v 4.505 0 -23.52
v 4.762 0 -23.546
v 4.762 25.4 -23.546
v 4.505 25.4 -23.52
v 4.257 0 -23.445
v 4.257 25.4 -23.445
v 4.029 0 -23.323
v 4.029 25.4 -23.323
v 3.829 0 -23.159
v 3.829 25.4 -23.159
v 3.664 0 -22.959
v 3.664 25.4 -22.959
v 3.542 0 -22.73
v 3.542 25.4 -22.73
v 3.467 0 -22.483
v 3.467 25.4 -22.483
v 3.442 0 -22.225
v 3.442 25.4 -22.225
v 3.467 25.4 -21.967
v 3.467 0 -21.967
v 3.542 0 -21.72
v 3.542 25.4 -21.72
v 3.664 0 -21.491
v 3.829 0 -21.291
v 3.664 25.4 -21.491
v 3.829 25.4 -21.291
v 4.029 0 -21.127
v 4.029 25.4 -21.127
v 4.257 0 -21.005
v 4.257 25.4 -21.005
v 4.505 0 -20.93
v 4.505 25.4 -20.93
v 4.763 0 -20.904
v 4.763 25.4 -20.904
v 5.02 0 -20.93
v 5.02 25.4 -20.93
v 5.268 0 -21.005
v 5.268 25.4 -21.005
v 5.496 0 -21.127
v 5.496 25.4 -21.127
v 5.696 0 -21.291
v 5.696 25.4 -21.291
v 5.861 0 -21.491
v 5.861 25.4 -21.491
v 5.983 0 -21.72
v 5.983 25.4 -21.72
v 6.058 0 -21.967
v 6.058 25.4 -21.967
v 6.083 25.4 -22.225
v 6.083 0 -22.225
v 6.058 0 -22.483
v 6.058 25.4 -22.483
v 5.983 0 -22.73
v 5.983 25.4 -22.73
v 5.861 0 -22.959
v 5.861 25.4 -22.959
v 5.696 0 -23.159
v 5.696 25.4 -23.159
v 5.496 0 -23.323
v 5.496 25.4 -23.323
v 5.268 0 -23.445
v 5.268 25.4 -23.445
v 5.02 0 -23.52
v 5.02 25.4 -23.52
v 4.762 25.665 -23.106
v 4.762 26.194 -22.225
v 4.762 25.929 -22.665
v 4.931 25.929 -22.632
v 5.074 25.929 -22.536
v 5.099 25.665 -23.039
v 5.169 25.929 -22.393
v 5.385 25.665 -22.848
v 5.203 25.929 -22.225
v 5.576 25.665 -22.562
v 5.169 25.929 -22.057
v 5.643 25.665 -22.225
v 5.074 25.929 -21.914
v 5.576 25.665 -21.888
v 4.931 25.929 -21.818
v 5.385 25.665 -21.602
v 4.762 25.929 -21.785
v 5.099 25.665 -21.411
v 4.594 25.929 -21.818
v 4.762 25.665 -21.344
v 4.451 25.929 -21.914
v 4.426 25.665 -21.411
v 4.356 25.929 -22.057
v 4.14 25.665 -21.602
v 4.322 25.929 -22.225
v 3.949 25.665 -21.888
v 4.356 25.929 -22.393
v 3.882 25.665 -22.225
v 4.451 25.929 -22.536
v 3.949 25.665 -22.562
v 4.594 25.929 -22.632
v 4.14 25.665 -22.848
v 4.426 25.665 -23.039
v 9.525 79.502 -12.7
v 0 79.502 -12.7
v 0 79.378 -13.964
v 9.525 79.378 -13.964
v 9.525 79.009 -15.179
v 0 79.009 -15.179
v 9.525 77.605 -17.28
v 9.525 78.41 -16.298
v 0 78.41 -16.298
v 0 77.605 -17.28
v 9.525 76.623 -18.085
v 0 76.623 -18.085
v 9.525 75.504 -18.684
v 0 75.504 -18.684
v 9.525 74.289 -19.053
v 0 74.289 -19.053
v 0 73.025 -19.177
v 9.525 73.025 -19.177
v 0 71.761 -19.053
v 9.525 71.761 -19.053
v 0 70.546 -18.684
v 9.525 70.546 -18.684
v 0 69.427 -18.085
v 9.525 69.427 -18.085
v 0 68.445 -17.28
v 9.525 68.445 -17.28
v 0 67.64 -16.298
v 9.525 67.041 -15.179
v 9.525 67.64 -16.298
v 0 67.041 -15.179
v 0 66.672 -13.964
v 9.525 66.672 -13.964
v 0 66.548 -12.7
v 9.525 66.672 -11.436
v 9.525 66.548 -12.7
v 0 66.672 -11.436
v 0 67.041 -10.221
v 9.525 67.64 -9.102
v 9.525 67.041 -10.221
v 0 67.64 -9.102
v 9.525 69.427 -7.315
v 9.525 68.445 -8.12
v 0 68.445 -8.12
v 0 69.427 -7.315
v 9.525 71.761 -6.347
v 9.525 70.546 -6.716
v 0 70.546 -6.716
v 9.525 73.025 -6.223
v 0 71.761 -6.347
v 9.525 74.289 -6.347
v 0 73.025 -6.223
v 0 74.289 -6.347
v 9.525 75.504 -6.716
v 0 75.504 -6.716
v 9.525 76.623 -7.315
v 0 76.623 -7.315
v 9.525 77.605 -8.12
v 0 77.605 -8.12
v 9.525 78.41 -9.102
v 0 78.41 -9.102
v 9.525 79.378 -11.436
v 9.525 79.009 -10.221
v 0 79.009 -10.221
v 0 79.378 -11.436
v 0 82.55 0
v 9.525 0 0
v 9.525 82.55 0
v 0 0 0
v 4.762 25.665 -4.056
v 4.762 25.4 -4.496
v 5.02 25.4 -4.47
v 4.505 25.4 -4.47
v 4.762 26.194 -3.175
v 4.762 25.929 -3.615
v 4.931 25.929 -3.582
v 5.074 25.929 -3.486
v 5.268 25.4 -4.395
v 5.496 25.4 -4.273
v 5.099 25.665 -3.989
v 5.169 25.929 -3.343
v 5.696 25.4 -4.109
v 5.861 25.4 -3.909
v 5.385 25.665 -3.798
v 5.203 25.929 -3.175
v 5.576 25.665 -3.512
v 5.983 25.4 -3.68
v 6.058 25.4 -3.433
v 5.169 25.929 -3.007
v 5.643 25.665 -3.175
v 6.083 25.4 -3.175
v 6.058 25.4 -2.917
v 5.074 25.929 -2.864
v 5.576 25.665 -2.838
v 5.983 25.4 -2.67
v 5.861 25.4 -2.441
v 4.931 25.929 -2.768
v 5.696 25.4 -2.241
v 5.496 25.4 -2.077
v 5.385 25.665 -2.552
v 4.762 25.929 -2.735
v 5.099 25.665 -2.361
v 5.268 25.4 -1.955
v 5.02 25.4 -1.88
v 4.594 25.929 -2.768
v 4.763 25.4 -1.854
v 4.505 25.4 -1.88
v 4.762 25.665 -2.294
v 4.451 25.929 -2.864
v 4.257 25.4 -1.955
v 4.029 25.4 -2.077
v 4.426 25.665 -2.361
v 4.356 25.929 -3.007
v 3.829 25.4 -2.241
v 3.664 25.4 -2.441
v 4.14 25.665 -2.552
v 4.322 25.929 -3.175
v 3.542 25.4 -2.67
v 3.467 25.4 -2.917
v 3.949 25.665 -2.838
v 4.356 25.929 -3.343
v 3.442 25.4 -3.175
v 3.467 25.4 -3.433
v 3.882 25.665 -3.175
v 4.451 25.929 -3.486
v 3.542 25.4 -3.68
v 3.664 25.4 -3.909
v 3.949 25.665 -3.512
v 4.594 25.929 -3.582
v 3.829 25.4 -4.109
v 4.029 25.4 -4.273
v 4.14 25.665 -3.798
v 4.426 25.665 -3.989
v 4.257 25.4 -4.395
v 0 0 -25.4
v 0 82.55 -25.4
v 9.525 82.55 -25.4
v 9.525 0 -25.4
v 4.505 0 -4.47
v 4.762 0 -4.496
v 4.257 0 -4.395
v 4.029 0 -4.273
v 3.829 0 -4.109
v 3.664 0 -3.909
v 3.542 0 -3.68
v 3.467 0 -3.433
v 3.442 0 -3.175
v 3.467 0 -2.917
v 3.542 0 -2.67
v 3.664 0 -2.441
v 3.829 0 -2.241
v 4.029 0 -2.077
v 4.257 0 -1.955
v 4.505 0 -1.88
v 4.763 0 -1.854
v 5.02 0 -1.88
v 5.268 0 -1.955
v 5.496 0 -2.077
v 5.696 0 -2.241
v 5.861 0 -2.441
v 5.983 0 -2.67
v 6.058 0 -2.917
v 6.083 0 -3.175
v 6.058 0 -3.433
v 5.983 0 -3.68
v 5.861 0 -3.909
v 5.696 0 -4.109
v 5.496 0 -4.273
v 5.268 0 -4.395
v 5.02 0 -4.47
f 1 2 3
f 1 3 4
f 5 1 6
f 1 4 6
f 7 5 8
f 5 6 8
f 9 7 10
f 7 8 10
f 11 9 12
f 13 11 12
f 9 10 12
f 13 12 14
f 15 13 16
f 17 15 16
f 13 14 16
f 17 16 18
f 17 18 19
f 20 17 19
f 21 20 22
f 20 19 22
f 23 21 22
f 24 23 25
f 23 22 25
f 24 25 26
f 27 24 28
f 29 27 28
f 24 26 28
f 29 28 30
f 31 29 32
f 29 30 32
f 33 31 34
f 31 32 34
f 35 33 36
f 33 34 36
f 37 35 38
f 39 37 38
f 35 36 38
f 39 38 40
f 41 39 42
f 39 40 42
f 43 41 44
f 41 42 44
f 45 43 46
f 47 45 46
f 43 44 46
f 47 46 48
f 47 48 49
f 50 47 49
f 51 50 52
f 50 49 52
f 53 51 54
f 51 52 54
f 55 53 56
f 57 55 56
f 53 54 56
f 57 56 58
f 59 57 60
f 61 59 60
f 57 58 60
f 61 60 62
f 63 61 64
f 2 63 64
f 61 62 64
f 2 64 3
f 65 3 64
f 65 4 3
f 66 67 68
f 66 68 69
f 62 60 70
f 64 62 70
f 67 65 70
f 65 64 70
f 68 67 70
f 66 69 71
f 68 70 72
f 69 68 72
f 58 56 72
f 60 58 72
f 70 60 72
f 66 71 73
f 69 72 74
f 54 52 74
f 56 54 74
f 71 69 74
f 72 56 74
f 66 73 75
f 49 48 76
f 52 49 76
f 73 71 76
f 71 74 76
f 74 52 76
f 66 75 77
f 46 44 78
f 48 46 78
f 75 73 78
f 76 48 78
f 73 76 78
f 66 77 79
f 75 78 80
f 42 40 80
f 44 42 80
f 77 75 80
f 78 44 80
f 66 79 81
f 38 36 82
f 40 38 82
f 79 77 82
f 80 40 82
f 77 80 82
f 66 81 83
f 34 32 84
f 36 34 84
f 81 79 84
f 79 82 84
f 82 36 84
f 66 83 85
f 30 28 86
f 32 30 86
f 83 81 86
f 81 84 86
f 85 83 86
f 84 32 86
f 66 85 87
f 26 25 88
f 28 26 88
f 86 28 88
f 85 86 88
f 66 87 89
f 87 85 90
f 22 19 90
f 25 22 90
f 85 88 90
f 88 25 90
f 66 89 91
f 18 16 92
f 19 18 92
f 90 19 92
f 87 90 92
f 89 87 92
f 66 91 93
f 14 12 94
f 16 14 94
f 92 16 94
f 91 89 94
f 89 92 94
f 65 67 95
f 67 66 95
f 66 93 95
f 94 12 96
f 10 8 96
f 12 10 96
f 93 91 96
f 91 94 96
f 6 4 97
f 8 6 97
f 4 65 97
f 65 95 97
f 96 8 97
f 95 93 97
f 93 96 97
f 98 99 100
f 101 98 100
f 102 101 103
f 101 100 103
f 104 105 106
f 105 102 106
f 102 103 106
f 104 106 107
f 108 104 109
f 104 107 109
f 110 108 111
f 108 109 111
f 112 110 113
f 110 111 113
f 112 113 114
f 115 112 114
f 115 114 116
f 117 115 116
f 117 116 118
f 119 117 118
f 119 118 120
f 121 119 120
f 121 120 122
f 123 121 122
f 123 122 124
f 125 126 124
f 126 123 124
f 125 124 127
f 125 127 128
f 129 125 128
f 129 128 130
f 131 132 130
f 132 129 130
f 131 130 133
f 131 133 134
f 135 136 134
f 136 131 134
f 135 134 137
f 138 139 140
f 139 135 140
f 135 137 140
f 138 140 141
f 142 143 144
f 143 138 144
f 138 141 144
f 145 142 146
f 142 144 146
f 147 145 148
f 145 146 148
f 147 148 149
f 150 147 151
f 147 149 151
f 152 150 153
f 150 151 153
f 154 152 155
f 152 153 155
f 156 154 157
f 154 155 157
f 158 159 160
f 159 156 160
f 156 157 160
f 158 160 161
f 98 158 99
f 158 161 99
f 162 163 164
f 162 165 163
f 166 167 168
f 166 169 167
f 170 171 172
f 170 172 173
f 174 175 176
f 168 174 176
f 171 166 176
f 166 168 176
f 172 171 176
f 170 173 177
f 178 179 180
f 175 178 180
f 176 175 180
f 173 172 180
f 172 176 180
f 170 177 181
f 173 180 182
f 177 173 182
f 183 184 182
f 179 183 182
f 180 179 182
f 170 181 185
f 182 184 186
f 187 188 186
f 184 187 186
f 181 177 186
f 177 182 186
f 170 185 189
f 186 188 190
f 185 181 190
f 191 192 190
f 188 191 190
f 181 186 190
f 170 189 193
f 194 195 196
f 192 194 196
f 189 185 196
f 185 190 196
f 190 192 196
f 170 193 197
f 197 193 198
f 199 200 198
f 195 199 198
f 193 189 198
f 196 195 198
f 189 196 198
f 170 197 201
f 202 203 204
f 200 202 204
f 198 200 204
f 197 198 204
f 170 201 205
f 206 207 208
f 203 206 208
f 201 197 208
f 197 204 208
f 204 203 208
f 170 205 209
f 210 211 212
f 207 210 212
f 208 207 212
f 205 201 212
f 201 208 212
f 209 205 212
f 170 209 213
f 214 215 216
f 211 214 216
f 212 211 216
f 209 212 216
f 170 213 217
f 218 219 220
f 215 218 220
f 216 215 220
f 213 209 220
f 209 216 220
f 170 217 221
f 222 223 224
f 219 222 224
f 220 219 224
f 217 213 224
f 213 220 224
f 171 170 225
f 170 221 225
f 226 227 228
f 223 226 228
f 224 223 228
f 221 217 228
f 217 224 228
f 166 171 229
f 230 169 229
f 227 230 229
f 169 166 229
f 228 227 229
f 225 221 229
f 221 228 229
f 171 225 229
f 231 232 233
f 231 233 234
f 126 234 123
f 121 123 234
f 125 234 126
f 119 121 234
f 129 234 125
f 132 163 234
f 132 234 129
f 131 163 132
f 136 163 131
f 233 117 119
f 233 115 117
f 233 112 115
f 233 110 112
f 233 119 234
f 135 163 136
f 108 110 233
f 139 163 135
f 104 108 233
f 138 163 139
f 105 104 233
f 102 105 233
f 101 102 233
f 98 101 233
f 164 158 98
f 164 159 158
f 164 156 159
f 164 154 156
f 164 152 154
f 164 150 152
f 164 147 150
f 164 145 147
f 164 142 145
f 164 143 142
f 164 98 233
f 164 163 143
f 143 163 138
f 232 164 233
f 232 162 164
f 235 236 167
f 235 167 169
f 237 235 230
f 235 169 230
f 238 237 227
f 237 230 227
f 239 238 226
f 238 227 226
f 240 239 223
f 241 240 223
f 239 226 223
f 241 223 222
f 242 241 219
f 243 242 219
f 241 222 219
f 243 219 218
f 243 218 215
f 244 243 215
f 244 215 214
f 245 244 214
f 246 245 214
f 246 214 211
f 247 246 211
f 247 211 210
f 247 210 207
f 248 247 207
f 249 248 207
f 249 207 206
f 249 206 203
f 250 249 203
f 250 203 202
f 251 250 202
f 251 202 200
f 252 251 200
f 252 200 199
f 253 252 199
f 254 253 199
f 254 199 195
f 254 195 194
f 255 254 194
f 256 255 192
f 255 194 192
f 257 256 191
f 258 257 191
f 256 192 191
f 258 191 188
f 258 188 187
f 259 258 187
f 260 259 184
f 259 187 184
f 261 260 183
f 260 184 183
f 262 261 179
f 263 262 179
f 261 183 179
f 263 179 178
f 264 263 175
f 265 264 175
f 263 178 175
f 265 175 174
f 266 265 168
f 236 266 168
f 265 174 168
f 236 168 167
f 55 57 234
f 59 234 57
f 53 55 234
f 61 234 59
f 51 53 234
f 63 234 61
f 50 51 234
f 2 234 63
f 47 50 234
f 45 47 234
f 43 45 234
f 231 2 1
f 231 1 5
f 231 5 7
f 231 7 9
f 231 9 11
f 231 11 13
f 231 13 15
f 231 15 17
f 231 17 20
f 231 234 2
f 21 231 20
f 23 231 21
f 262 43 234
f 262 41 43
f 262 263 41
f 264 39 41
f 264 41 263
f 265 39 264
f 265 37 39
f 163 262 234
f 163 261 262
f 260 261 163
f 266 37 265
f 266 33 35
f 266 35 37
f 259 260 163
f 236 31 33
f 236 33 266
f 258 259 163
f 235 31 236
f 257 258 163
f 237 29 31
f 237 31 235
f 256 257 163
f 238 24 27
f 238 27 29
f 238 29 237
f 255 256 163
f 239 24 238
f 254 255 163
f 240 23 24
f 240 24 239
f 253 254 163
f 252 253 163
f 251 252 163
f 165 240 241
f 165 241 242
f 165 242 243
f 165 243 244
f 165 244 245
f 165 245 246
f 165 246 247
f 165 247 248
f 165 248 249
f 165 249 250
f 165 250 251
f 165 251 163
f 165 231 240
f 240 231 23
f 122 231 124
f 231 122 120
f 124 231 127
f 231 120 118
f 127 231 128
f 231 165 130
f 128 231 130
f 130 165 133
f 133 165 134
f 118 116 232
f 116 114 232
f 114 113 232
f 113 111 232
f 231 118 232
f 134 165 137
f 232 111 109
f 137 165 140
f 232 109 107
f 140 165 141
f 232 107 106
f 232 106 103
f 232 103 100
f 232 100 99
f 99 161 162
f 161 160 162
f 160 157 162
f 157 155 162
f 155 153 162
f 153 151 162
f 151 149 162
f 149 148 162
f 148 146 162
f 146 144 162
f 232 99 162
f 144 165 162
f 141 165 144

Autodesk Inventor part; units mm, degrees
ref_plane "YZ Plane" through (0, 0, 0) normal (1, 0, 0) x (0, 1, 0)
ref_plane "XZ Plane" through (0, 0, 0) normal (0, 1, 0) x (-1, 0, 0)
ref_plane "XY Plane" through (0, 0, 0) normal (0, 0, 1) x (1, 0, 0)
sketch "Sketch1" plane through (0, 0, 0) normal (1, 0, 0) x (0, 1, 0)
  line L0 (0, 0) -> (82.55, 0)
  line L1 (82.55, 0) -> (82.55, -25.4)
  line L2 (82.55, -25.4) -> (0, -25.4)
  line L3 (0, -25.4) -> (0, 0)
  circle A0 centre (73.025, -12.7) radius 6.477
  dimension "d0" = 82.55
  dimension "d1" = 25.4
  dimension "d2" = 12.954
  dimension "d3" = 73.025
extrude "Extrusion1" add sketch "Sketch1" along normal blind 9.525
sketch "Sketch2" plane through (0, 0, -25.4) normal (0, -1, 0) x (1, 0, 0)
  line L0 (0, 0) -> (0, 25.4) projected
  line L1 (0, 0) -> (9.525, 0) projected
  line L2 (9.525, 25.4) -> (9.525, 0) projected
  line L3 (0, 25.4) -> (9.525, 25.4) projected
  point P0 (4.7625, 22.225)
  point P1 (4.7625, 3.175)
  dimension "d6" = 25.4
  dimension "d7" = 3.175
  dimension "d8" = 3.175
hole "Hole1" at (4.7625, 0, -3.175) at (4.7625, 0, -22.225) direction (0, 1, 0) diameter 2.6416 depth 25.4 tip angle 118 thread size "6-32 UNC" class "2B" standard "ANSI Unified Screw Threads"
equation "\"d8\" = d7"
properties part number "SlidesPivotBracket"
